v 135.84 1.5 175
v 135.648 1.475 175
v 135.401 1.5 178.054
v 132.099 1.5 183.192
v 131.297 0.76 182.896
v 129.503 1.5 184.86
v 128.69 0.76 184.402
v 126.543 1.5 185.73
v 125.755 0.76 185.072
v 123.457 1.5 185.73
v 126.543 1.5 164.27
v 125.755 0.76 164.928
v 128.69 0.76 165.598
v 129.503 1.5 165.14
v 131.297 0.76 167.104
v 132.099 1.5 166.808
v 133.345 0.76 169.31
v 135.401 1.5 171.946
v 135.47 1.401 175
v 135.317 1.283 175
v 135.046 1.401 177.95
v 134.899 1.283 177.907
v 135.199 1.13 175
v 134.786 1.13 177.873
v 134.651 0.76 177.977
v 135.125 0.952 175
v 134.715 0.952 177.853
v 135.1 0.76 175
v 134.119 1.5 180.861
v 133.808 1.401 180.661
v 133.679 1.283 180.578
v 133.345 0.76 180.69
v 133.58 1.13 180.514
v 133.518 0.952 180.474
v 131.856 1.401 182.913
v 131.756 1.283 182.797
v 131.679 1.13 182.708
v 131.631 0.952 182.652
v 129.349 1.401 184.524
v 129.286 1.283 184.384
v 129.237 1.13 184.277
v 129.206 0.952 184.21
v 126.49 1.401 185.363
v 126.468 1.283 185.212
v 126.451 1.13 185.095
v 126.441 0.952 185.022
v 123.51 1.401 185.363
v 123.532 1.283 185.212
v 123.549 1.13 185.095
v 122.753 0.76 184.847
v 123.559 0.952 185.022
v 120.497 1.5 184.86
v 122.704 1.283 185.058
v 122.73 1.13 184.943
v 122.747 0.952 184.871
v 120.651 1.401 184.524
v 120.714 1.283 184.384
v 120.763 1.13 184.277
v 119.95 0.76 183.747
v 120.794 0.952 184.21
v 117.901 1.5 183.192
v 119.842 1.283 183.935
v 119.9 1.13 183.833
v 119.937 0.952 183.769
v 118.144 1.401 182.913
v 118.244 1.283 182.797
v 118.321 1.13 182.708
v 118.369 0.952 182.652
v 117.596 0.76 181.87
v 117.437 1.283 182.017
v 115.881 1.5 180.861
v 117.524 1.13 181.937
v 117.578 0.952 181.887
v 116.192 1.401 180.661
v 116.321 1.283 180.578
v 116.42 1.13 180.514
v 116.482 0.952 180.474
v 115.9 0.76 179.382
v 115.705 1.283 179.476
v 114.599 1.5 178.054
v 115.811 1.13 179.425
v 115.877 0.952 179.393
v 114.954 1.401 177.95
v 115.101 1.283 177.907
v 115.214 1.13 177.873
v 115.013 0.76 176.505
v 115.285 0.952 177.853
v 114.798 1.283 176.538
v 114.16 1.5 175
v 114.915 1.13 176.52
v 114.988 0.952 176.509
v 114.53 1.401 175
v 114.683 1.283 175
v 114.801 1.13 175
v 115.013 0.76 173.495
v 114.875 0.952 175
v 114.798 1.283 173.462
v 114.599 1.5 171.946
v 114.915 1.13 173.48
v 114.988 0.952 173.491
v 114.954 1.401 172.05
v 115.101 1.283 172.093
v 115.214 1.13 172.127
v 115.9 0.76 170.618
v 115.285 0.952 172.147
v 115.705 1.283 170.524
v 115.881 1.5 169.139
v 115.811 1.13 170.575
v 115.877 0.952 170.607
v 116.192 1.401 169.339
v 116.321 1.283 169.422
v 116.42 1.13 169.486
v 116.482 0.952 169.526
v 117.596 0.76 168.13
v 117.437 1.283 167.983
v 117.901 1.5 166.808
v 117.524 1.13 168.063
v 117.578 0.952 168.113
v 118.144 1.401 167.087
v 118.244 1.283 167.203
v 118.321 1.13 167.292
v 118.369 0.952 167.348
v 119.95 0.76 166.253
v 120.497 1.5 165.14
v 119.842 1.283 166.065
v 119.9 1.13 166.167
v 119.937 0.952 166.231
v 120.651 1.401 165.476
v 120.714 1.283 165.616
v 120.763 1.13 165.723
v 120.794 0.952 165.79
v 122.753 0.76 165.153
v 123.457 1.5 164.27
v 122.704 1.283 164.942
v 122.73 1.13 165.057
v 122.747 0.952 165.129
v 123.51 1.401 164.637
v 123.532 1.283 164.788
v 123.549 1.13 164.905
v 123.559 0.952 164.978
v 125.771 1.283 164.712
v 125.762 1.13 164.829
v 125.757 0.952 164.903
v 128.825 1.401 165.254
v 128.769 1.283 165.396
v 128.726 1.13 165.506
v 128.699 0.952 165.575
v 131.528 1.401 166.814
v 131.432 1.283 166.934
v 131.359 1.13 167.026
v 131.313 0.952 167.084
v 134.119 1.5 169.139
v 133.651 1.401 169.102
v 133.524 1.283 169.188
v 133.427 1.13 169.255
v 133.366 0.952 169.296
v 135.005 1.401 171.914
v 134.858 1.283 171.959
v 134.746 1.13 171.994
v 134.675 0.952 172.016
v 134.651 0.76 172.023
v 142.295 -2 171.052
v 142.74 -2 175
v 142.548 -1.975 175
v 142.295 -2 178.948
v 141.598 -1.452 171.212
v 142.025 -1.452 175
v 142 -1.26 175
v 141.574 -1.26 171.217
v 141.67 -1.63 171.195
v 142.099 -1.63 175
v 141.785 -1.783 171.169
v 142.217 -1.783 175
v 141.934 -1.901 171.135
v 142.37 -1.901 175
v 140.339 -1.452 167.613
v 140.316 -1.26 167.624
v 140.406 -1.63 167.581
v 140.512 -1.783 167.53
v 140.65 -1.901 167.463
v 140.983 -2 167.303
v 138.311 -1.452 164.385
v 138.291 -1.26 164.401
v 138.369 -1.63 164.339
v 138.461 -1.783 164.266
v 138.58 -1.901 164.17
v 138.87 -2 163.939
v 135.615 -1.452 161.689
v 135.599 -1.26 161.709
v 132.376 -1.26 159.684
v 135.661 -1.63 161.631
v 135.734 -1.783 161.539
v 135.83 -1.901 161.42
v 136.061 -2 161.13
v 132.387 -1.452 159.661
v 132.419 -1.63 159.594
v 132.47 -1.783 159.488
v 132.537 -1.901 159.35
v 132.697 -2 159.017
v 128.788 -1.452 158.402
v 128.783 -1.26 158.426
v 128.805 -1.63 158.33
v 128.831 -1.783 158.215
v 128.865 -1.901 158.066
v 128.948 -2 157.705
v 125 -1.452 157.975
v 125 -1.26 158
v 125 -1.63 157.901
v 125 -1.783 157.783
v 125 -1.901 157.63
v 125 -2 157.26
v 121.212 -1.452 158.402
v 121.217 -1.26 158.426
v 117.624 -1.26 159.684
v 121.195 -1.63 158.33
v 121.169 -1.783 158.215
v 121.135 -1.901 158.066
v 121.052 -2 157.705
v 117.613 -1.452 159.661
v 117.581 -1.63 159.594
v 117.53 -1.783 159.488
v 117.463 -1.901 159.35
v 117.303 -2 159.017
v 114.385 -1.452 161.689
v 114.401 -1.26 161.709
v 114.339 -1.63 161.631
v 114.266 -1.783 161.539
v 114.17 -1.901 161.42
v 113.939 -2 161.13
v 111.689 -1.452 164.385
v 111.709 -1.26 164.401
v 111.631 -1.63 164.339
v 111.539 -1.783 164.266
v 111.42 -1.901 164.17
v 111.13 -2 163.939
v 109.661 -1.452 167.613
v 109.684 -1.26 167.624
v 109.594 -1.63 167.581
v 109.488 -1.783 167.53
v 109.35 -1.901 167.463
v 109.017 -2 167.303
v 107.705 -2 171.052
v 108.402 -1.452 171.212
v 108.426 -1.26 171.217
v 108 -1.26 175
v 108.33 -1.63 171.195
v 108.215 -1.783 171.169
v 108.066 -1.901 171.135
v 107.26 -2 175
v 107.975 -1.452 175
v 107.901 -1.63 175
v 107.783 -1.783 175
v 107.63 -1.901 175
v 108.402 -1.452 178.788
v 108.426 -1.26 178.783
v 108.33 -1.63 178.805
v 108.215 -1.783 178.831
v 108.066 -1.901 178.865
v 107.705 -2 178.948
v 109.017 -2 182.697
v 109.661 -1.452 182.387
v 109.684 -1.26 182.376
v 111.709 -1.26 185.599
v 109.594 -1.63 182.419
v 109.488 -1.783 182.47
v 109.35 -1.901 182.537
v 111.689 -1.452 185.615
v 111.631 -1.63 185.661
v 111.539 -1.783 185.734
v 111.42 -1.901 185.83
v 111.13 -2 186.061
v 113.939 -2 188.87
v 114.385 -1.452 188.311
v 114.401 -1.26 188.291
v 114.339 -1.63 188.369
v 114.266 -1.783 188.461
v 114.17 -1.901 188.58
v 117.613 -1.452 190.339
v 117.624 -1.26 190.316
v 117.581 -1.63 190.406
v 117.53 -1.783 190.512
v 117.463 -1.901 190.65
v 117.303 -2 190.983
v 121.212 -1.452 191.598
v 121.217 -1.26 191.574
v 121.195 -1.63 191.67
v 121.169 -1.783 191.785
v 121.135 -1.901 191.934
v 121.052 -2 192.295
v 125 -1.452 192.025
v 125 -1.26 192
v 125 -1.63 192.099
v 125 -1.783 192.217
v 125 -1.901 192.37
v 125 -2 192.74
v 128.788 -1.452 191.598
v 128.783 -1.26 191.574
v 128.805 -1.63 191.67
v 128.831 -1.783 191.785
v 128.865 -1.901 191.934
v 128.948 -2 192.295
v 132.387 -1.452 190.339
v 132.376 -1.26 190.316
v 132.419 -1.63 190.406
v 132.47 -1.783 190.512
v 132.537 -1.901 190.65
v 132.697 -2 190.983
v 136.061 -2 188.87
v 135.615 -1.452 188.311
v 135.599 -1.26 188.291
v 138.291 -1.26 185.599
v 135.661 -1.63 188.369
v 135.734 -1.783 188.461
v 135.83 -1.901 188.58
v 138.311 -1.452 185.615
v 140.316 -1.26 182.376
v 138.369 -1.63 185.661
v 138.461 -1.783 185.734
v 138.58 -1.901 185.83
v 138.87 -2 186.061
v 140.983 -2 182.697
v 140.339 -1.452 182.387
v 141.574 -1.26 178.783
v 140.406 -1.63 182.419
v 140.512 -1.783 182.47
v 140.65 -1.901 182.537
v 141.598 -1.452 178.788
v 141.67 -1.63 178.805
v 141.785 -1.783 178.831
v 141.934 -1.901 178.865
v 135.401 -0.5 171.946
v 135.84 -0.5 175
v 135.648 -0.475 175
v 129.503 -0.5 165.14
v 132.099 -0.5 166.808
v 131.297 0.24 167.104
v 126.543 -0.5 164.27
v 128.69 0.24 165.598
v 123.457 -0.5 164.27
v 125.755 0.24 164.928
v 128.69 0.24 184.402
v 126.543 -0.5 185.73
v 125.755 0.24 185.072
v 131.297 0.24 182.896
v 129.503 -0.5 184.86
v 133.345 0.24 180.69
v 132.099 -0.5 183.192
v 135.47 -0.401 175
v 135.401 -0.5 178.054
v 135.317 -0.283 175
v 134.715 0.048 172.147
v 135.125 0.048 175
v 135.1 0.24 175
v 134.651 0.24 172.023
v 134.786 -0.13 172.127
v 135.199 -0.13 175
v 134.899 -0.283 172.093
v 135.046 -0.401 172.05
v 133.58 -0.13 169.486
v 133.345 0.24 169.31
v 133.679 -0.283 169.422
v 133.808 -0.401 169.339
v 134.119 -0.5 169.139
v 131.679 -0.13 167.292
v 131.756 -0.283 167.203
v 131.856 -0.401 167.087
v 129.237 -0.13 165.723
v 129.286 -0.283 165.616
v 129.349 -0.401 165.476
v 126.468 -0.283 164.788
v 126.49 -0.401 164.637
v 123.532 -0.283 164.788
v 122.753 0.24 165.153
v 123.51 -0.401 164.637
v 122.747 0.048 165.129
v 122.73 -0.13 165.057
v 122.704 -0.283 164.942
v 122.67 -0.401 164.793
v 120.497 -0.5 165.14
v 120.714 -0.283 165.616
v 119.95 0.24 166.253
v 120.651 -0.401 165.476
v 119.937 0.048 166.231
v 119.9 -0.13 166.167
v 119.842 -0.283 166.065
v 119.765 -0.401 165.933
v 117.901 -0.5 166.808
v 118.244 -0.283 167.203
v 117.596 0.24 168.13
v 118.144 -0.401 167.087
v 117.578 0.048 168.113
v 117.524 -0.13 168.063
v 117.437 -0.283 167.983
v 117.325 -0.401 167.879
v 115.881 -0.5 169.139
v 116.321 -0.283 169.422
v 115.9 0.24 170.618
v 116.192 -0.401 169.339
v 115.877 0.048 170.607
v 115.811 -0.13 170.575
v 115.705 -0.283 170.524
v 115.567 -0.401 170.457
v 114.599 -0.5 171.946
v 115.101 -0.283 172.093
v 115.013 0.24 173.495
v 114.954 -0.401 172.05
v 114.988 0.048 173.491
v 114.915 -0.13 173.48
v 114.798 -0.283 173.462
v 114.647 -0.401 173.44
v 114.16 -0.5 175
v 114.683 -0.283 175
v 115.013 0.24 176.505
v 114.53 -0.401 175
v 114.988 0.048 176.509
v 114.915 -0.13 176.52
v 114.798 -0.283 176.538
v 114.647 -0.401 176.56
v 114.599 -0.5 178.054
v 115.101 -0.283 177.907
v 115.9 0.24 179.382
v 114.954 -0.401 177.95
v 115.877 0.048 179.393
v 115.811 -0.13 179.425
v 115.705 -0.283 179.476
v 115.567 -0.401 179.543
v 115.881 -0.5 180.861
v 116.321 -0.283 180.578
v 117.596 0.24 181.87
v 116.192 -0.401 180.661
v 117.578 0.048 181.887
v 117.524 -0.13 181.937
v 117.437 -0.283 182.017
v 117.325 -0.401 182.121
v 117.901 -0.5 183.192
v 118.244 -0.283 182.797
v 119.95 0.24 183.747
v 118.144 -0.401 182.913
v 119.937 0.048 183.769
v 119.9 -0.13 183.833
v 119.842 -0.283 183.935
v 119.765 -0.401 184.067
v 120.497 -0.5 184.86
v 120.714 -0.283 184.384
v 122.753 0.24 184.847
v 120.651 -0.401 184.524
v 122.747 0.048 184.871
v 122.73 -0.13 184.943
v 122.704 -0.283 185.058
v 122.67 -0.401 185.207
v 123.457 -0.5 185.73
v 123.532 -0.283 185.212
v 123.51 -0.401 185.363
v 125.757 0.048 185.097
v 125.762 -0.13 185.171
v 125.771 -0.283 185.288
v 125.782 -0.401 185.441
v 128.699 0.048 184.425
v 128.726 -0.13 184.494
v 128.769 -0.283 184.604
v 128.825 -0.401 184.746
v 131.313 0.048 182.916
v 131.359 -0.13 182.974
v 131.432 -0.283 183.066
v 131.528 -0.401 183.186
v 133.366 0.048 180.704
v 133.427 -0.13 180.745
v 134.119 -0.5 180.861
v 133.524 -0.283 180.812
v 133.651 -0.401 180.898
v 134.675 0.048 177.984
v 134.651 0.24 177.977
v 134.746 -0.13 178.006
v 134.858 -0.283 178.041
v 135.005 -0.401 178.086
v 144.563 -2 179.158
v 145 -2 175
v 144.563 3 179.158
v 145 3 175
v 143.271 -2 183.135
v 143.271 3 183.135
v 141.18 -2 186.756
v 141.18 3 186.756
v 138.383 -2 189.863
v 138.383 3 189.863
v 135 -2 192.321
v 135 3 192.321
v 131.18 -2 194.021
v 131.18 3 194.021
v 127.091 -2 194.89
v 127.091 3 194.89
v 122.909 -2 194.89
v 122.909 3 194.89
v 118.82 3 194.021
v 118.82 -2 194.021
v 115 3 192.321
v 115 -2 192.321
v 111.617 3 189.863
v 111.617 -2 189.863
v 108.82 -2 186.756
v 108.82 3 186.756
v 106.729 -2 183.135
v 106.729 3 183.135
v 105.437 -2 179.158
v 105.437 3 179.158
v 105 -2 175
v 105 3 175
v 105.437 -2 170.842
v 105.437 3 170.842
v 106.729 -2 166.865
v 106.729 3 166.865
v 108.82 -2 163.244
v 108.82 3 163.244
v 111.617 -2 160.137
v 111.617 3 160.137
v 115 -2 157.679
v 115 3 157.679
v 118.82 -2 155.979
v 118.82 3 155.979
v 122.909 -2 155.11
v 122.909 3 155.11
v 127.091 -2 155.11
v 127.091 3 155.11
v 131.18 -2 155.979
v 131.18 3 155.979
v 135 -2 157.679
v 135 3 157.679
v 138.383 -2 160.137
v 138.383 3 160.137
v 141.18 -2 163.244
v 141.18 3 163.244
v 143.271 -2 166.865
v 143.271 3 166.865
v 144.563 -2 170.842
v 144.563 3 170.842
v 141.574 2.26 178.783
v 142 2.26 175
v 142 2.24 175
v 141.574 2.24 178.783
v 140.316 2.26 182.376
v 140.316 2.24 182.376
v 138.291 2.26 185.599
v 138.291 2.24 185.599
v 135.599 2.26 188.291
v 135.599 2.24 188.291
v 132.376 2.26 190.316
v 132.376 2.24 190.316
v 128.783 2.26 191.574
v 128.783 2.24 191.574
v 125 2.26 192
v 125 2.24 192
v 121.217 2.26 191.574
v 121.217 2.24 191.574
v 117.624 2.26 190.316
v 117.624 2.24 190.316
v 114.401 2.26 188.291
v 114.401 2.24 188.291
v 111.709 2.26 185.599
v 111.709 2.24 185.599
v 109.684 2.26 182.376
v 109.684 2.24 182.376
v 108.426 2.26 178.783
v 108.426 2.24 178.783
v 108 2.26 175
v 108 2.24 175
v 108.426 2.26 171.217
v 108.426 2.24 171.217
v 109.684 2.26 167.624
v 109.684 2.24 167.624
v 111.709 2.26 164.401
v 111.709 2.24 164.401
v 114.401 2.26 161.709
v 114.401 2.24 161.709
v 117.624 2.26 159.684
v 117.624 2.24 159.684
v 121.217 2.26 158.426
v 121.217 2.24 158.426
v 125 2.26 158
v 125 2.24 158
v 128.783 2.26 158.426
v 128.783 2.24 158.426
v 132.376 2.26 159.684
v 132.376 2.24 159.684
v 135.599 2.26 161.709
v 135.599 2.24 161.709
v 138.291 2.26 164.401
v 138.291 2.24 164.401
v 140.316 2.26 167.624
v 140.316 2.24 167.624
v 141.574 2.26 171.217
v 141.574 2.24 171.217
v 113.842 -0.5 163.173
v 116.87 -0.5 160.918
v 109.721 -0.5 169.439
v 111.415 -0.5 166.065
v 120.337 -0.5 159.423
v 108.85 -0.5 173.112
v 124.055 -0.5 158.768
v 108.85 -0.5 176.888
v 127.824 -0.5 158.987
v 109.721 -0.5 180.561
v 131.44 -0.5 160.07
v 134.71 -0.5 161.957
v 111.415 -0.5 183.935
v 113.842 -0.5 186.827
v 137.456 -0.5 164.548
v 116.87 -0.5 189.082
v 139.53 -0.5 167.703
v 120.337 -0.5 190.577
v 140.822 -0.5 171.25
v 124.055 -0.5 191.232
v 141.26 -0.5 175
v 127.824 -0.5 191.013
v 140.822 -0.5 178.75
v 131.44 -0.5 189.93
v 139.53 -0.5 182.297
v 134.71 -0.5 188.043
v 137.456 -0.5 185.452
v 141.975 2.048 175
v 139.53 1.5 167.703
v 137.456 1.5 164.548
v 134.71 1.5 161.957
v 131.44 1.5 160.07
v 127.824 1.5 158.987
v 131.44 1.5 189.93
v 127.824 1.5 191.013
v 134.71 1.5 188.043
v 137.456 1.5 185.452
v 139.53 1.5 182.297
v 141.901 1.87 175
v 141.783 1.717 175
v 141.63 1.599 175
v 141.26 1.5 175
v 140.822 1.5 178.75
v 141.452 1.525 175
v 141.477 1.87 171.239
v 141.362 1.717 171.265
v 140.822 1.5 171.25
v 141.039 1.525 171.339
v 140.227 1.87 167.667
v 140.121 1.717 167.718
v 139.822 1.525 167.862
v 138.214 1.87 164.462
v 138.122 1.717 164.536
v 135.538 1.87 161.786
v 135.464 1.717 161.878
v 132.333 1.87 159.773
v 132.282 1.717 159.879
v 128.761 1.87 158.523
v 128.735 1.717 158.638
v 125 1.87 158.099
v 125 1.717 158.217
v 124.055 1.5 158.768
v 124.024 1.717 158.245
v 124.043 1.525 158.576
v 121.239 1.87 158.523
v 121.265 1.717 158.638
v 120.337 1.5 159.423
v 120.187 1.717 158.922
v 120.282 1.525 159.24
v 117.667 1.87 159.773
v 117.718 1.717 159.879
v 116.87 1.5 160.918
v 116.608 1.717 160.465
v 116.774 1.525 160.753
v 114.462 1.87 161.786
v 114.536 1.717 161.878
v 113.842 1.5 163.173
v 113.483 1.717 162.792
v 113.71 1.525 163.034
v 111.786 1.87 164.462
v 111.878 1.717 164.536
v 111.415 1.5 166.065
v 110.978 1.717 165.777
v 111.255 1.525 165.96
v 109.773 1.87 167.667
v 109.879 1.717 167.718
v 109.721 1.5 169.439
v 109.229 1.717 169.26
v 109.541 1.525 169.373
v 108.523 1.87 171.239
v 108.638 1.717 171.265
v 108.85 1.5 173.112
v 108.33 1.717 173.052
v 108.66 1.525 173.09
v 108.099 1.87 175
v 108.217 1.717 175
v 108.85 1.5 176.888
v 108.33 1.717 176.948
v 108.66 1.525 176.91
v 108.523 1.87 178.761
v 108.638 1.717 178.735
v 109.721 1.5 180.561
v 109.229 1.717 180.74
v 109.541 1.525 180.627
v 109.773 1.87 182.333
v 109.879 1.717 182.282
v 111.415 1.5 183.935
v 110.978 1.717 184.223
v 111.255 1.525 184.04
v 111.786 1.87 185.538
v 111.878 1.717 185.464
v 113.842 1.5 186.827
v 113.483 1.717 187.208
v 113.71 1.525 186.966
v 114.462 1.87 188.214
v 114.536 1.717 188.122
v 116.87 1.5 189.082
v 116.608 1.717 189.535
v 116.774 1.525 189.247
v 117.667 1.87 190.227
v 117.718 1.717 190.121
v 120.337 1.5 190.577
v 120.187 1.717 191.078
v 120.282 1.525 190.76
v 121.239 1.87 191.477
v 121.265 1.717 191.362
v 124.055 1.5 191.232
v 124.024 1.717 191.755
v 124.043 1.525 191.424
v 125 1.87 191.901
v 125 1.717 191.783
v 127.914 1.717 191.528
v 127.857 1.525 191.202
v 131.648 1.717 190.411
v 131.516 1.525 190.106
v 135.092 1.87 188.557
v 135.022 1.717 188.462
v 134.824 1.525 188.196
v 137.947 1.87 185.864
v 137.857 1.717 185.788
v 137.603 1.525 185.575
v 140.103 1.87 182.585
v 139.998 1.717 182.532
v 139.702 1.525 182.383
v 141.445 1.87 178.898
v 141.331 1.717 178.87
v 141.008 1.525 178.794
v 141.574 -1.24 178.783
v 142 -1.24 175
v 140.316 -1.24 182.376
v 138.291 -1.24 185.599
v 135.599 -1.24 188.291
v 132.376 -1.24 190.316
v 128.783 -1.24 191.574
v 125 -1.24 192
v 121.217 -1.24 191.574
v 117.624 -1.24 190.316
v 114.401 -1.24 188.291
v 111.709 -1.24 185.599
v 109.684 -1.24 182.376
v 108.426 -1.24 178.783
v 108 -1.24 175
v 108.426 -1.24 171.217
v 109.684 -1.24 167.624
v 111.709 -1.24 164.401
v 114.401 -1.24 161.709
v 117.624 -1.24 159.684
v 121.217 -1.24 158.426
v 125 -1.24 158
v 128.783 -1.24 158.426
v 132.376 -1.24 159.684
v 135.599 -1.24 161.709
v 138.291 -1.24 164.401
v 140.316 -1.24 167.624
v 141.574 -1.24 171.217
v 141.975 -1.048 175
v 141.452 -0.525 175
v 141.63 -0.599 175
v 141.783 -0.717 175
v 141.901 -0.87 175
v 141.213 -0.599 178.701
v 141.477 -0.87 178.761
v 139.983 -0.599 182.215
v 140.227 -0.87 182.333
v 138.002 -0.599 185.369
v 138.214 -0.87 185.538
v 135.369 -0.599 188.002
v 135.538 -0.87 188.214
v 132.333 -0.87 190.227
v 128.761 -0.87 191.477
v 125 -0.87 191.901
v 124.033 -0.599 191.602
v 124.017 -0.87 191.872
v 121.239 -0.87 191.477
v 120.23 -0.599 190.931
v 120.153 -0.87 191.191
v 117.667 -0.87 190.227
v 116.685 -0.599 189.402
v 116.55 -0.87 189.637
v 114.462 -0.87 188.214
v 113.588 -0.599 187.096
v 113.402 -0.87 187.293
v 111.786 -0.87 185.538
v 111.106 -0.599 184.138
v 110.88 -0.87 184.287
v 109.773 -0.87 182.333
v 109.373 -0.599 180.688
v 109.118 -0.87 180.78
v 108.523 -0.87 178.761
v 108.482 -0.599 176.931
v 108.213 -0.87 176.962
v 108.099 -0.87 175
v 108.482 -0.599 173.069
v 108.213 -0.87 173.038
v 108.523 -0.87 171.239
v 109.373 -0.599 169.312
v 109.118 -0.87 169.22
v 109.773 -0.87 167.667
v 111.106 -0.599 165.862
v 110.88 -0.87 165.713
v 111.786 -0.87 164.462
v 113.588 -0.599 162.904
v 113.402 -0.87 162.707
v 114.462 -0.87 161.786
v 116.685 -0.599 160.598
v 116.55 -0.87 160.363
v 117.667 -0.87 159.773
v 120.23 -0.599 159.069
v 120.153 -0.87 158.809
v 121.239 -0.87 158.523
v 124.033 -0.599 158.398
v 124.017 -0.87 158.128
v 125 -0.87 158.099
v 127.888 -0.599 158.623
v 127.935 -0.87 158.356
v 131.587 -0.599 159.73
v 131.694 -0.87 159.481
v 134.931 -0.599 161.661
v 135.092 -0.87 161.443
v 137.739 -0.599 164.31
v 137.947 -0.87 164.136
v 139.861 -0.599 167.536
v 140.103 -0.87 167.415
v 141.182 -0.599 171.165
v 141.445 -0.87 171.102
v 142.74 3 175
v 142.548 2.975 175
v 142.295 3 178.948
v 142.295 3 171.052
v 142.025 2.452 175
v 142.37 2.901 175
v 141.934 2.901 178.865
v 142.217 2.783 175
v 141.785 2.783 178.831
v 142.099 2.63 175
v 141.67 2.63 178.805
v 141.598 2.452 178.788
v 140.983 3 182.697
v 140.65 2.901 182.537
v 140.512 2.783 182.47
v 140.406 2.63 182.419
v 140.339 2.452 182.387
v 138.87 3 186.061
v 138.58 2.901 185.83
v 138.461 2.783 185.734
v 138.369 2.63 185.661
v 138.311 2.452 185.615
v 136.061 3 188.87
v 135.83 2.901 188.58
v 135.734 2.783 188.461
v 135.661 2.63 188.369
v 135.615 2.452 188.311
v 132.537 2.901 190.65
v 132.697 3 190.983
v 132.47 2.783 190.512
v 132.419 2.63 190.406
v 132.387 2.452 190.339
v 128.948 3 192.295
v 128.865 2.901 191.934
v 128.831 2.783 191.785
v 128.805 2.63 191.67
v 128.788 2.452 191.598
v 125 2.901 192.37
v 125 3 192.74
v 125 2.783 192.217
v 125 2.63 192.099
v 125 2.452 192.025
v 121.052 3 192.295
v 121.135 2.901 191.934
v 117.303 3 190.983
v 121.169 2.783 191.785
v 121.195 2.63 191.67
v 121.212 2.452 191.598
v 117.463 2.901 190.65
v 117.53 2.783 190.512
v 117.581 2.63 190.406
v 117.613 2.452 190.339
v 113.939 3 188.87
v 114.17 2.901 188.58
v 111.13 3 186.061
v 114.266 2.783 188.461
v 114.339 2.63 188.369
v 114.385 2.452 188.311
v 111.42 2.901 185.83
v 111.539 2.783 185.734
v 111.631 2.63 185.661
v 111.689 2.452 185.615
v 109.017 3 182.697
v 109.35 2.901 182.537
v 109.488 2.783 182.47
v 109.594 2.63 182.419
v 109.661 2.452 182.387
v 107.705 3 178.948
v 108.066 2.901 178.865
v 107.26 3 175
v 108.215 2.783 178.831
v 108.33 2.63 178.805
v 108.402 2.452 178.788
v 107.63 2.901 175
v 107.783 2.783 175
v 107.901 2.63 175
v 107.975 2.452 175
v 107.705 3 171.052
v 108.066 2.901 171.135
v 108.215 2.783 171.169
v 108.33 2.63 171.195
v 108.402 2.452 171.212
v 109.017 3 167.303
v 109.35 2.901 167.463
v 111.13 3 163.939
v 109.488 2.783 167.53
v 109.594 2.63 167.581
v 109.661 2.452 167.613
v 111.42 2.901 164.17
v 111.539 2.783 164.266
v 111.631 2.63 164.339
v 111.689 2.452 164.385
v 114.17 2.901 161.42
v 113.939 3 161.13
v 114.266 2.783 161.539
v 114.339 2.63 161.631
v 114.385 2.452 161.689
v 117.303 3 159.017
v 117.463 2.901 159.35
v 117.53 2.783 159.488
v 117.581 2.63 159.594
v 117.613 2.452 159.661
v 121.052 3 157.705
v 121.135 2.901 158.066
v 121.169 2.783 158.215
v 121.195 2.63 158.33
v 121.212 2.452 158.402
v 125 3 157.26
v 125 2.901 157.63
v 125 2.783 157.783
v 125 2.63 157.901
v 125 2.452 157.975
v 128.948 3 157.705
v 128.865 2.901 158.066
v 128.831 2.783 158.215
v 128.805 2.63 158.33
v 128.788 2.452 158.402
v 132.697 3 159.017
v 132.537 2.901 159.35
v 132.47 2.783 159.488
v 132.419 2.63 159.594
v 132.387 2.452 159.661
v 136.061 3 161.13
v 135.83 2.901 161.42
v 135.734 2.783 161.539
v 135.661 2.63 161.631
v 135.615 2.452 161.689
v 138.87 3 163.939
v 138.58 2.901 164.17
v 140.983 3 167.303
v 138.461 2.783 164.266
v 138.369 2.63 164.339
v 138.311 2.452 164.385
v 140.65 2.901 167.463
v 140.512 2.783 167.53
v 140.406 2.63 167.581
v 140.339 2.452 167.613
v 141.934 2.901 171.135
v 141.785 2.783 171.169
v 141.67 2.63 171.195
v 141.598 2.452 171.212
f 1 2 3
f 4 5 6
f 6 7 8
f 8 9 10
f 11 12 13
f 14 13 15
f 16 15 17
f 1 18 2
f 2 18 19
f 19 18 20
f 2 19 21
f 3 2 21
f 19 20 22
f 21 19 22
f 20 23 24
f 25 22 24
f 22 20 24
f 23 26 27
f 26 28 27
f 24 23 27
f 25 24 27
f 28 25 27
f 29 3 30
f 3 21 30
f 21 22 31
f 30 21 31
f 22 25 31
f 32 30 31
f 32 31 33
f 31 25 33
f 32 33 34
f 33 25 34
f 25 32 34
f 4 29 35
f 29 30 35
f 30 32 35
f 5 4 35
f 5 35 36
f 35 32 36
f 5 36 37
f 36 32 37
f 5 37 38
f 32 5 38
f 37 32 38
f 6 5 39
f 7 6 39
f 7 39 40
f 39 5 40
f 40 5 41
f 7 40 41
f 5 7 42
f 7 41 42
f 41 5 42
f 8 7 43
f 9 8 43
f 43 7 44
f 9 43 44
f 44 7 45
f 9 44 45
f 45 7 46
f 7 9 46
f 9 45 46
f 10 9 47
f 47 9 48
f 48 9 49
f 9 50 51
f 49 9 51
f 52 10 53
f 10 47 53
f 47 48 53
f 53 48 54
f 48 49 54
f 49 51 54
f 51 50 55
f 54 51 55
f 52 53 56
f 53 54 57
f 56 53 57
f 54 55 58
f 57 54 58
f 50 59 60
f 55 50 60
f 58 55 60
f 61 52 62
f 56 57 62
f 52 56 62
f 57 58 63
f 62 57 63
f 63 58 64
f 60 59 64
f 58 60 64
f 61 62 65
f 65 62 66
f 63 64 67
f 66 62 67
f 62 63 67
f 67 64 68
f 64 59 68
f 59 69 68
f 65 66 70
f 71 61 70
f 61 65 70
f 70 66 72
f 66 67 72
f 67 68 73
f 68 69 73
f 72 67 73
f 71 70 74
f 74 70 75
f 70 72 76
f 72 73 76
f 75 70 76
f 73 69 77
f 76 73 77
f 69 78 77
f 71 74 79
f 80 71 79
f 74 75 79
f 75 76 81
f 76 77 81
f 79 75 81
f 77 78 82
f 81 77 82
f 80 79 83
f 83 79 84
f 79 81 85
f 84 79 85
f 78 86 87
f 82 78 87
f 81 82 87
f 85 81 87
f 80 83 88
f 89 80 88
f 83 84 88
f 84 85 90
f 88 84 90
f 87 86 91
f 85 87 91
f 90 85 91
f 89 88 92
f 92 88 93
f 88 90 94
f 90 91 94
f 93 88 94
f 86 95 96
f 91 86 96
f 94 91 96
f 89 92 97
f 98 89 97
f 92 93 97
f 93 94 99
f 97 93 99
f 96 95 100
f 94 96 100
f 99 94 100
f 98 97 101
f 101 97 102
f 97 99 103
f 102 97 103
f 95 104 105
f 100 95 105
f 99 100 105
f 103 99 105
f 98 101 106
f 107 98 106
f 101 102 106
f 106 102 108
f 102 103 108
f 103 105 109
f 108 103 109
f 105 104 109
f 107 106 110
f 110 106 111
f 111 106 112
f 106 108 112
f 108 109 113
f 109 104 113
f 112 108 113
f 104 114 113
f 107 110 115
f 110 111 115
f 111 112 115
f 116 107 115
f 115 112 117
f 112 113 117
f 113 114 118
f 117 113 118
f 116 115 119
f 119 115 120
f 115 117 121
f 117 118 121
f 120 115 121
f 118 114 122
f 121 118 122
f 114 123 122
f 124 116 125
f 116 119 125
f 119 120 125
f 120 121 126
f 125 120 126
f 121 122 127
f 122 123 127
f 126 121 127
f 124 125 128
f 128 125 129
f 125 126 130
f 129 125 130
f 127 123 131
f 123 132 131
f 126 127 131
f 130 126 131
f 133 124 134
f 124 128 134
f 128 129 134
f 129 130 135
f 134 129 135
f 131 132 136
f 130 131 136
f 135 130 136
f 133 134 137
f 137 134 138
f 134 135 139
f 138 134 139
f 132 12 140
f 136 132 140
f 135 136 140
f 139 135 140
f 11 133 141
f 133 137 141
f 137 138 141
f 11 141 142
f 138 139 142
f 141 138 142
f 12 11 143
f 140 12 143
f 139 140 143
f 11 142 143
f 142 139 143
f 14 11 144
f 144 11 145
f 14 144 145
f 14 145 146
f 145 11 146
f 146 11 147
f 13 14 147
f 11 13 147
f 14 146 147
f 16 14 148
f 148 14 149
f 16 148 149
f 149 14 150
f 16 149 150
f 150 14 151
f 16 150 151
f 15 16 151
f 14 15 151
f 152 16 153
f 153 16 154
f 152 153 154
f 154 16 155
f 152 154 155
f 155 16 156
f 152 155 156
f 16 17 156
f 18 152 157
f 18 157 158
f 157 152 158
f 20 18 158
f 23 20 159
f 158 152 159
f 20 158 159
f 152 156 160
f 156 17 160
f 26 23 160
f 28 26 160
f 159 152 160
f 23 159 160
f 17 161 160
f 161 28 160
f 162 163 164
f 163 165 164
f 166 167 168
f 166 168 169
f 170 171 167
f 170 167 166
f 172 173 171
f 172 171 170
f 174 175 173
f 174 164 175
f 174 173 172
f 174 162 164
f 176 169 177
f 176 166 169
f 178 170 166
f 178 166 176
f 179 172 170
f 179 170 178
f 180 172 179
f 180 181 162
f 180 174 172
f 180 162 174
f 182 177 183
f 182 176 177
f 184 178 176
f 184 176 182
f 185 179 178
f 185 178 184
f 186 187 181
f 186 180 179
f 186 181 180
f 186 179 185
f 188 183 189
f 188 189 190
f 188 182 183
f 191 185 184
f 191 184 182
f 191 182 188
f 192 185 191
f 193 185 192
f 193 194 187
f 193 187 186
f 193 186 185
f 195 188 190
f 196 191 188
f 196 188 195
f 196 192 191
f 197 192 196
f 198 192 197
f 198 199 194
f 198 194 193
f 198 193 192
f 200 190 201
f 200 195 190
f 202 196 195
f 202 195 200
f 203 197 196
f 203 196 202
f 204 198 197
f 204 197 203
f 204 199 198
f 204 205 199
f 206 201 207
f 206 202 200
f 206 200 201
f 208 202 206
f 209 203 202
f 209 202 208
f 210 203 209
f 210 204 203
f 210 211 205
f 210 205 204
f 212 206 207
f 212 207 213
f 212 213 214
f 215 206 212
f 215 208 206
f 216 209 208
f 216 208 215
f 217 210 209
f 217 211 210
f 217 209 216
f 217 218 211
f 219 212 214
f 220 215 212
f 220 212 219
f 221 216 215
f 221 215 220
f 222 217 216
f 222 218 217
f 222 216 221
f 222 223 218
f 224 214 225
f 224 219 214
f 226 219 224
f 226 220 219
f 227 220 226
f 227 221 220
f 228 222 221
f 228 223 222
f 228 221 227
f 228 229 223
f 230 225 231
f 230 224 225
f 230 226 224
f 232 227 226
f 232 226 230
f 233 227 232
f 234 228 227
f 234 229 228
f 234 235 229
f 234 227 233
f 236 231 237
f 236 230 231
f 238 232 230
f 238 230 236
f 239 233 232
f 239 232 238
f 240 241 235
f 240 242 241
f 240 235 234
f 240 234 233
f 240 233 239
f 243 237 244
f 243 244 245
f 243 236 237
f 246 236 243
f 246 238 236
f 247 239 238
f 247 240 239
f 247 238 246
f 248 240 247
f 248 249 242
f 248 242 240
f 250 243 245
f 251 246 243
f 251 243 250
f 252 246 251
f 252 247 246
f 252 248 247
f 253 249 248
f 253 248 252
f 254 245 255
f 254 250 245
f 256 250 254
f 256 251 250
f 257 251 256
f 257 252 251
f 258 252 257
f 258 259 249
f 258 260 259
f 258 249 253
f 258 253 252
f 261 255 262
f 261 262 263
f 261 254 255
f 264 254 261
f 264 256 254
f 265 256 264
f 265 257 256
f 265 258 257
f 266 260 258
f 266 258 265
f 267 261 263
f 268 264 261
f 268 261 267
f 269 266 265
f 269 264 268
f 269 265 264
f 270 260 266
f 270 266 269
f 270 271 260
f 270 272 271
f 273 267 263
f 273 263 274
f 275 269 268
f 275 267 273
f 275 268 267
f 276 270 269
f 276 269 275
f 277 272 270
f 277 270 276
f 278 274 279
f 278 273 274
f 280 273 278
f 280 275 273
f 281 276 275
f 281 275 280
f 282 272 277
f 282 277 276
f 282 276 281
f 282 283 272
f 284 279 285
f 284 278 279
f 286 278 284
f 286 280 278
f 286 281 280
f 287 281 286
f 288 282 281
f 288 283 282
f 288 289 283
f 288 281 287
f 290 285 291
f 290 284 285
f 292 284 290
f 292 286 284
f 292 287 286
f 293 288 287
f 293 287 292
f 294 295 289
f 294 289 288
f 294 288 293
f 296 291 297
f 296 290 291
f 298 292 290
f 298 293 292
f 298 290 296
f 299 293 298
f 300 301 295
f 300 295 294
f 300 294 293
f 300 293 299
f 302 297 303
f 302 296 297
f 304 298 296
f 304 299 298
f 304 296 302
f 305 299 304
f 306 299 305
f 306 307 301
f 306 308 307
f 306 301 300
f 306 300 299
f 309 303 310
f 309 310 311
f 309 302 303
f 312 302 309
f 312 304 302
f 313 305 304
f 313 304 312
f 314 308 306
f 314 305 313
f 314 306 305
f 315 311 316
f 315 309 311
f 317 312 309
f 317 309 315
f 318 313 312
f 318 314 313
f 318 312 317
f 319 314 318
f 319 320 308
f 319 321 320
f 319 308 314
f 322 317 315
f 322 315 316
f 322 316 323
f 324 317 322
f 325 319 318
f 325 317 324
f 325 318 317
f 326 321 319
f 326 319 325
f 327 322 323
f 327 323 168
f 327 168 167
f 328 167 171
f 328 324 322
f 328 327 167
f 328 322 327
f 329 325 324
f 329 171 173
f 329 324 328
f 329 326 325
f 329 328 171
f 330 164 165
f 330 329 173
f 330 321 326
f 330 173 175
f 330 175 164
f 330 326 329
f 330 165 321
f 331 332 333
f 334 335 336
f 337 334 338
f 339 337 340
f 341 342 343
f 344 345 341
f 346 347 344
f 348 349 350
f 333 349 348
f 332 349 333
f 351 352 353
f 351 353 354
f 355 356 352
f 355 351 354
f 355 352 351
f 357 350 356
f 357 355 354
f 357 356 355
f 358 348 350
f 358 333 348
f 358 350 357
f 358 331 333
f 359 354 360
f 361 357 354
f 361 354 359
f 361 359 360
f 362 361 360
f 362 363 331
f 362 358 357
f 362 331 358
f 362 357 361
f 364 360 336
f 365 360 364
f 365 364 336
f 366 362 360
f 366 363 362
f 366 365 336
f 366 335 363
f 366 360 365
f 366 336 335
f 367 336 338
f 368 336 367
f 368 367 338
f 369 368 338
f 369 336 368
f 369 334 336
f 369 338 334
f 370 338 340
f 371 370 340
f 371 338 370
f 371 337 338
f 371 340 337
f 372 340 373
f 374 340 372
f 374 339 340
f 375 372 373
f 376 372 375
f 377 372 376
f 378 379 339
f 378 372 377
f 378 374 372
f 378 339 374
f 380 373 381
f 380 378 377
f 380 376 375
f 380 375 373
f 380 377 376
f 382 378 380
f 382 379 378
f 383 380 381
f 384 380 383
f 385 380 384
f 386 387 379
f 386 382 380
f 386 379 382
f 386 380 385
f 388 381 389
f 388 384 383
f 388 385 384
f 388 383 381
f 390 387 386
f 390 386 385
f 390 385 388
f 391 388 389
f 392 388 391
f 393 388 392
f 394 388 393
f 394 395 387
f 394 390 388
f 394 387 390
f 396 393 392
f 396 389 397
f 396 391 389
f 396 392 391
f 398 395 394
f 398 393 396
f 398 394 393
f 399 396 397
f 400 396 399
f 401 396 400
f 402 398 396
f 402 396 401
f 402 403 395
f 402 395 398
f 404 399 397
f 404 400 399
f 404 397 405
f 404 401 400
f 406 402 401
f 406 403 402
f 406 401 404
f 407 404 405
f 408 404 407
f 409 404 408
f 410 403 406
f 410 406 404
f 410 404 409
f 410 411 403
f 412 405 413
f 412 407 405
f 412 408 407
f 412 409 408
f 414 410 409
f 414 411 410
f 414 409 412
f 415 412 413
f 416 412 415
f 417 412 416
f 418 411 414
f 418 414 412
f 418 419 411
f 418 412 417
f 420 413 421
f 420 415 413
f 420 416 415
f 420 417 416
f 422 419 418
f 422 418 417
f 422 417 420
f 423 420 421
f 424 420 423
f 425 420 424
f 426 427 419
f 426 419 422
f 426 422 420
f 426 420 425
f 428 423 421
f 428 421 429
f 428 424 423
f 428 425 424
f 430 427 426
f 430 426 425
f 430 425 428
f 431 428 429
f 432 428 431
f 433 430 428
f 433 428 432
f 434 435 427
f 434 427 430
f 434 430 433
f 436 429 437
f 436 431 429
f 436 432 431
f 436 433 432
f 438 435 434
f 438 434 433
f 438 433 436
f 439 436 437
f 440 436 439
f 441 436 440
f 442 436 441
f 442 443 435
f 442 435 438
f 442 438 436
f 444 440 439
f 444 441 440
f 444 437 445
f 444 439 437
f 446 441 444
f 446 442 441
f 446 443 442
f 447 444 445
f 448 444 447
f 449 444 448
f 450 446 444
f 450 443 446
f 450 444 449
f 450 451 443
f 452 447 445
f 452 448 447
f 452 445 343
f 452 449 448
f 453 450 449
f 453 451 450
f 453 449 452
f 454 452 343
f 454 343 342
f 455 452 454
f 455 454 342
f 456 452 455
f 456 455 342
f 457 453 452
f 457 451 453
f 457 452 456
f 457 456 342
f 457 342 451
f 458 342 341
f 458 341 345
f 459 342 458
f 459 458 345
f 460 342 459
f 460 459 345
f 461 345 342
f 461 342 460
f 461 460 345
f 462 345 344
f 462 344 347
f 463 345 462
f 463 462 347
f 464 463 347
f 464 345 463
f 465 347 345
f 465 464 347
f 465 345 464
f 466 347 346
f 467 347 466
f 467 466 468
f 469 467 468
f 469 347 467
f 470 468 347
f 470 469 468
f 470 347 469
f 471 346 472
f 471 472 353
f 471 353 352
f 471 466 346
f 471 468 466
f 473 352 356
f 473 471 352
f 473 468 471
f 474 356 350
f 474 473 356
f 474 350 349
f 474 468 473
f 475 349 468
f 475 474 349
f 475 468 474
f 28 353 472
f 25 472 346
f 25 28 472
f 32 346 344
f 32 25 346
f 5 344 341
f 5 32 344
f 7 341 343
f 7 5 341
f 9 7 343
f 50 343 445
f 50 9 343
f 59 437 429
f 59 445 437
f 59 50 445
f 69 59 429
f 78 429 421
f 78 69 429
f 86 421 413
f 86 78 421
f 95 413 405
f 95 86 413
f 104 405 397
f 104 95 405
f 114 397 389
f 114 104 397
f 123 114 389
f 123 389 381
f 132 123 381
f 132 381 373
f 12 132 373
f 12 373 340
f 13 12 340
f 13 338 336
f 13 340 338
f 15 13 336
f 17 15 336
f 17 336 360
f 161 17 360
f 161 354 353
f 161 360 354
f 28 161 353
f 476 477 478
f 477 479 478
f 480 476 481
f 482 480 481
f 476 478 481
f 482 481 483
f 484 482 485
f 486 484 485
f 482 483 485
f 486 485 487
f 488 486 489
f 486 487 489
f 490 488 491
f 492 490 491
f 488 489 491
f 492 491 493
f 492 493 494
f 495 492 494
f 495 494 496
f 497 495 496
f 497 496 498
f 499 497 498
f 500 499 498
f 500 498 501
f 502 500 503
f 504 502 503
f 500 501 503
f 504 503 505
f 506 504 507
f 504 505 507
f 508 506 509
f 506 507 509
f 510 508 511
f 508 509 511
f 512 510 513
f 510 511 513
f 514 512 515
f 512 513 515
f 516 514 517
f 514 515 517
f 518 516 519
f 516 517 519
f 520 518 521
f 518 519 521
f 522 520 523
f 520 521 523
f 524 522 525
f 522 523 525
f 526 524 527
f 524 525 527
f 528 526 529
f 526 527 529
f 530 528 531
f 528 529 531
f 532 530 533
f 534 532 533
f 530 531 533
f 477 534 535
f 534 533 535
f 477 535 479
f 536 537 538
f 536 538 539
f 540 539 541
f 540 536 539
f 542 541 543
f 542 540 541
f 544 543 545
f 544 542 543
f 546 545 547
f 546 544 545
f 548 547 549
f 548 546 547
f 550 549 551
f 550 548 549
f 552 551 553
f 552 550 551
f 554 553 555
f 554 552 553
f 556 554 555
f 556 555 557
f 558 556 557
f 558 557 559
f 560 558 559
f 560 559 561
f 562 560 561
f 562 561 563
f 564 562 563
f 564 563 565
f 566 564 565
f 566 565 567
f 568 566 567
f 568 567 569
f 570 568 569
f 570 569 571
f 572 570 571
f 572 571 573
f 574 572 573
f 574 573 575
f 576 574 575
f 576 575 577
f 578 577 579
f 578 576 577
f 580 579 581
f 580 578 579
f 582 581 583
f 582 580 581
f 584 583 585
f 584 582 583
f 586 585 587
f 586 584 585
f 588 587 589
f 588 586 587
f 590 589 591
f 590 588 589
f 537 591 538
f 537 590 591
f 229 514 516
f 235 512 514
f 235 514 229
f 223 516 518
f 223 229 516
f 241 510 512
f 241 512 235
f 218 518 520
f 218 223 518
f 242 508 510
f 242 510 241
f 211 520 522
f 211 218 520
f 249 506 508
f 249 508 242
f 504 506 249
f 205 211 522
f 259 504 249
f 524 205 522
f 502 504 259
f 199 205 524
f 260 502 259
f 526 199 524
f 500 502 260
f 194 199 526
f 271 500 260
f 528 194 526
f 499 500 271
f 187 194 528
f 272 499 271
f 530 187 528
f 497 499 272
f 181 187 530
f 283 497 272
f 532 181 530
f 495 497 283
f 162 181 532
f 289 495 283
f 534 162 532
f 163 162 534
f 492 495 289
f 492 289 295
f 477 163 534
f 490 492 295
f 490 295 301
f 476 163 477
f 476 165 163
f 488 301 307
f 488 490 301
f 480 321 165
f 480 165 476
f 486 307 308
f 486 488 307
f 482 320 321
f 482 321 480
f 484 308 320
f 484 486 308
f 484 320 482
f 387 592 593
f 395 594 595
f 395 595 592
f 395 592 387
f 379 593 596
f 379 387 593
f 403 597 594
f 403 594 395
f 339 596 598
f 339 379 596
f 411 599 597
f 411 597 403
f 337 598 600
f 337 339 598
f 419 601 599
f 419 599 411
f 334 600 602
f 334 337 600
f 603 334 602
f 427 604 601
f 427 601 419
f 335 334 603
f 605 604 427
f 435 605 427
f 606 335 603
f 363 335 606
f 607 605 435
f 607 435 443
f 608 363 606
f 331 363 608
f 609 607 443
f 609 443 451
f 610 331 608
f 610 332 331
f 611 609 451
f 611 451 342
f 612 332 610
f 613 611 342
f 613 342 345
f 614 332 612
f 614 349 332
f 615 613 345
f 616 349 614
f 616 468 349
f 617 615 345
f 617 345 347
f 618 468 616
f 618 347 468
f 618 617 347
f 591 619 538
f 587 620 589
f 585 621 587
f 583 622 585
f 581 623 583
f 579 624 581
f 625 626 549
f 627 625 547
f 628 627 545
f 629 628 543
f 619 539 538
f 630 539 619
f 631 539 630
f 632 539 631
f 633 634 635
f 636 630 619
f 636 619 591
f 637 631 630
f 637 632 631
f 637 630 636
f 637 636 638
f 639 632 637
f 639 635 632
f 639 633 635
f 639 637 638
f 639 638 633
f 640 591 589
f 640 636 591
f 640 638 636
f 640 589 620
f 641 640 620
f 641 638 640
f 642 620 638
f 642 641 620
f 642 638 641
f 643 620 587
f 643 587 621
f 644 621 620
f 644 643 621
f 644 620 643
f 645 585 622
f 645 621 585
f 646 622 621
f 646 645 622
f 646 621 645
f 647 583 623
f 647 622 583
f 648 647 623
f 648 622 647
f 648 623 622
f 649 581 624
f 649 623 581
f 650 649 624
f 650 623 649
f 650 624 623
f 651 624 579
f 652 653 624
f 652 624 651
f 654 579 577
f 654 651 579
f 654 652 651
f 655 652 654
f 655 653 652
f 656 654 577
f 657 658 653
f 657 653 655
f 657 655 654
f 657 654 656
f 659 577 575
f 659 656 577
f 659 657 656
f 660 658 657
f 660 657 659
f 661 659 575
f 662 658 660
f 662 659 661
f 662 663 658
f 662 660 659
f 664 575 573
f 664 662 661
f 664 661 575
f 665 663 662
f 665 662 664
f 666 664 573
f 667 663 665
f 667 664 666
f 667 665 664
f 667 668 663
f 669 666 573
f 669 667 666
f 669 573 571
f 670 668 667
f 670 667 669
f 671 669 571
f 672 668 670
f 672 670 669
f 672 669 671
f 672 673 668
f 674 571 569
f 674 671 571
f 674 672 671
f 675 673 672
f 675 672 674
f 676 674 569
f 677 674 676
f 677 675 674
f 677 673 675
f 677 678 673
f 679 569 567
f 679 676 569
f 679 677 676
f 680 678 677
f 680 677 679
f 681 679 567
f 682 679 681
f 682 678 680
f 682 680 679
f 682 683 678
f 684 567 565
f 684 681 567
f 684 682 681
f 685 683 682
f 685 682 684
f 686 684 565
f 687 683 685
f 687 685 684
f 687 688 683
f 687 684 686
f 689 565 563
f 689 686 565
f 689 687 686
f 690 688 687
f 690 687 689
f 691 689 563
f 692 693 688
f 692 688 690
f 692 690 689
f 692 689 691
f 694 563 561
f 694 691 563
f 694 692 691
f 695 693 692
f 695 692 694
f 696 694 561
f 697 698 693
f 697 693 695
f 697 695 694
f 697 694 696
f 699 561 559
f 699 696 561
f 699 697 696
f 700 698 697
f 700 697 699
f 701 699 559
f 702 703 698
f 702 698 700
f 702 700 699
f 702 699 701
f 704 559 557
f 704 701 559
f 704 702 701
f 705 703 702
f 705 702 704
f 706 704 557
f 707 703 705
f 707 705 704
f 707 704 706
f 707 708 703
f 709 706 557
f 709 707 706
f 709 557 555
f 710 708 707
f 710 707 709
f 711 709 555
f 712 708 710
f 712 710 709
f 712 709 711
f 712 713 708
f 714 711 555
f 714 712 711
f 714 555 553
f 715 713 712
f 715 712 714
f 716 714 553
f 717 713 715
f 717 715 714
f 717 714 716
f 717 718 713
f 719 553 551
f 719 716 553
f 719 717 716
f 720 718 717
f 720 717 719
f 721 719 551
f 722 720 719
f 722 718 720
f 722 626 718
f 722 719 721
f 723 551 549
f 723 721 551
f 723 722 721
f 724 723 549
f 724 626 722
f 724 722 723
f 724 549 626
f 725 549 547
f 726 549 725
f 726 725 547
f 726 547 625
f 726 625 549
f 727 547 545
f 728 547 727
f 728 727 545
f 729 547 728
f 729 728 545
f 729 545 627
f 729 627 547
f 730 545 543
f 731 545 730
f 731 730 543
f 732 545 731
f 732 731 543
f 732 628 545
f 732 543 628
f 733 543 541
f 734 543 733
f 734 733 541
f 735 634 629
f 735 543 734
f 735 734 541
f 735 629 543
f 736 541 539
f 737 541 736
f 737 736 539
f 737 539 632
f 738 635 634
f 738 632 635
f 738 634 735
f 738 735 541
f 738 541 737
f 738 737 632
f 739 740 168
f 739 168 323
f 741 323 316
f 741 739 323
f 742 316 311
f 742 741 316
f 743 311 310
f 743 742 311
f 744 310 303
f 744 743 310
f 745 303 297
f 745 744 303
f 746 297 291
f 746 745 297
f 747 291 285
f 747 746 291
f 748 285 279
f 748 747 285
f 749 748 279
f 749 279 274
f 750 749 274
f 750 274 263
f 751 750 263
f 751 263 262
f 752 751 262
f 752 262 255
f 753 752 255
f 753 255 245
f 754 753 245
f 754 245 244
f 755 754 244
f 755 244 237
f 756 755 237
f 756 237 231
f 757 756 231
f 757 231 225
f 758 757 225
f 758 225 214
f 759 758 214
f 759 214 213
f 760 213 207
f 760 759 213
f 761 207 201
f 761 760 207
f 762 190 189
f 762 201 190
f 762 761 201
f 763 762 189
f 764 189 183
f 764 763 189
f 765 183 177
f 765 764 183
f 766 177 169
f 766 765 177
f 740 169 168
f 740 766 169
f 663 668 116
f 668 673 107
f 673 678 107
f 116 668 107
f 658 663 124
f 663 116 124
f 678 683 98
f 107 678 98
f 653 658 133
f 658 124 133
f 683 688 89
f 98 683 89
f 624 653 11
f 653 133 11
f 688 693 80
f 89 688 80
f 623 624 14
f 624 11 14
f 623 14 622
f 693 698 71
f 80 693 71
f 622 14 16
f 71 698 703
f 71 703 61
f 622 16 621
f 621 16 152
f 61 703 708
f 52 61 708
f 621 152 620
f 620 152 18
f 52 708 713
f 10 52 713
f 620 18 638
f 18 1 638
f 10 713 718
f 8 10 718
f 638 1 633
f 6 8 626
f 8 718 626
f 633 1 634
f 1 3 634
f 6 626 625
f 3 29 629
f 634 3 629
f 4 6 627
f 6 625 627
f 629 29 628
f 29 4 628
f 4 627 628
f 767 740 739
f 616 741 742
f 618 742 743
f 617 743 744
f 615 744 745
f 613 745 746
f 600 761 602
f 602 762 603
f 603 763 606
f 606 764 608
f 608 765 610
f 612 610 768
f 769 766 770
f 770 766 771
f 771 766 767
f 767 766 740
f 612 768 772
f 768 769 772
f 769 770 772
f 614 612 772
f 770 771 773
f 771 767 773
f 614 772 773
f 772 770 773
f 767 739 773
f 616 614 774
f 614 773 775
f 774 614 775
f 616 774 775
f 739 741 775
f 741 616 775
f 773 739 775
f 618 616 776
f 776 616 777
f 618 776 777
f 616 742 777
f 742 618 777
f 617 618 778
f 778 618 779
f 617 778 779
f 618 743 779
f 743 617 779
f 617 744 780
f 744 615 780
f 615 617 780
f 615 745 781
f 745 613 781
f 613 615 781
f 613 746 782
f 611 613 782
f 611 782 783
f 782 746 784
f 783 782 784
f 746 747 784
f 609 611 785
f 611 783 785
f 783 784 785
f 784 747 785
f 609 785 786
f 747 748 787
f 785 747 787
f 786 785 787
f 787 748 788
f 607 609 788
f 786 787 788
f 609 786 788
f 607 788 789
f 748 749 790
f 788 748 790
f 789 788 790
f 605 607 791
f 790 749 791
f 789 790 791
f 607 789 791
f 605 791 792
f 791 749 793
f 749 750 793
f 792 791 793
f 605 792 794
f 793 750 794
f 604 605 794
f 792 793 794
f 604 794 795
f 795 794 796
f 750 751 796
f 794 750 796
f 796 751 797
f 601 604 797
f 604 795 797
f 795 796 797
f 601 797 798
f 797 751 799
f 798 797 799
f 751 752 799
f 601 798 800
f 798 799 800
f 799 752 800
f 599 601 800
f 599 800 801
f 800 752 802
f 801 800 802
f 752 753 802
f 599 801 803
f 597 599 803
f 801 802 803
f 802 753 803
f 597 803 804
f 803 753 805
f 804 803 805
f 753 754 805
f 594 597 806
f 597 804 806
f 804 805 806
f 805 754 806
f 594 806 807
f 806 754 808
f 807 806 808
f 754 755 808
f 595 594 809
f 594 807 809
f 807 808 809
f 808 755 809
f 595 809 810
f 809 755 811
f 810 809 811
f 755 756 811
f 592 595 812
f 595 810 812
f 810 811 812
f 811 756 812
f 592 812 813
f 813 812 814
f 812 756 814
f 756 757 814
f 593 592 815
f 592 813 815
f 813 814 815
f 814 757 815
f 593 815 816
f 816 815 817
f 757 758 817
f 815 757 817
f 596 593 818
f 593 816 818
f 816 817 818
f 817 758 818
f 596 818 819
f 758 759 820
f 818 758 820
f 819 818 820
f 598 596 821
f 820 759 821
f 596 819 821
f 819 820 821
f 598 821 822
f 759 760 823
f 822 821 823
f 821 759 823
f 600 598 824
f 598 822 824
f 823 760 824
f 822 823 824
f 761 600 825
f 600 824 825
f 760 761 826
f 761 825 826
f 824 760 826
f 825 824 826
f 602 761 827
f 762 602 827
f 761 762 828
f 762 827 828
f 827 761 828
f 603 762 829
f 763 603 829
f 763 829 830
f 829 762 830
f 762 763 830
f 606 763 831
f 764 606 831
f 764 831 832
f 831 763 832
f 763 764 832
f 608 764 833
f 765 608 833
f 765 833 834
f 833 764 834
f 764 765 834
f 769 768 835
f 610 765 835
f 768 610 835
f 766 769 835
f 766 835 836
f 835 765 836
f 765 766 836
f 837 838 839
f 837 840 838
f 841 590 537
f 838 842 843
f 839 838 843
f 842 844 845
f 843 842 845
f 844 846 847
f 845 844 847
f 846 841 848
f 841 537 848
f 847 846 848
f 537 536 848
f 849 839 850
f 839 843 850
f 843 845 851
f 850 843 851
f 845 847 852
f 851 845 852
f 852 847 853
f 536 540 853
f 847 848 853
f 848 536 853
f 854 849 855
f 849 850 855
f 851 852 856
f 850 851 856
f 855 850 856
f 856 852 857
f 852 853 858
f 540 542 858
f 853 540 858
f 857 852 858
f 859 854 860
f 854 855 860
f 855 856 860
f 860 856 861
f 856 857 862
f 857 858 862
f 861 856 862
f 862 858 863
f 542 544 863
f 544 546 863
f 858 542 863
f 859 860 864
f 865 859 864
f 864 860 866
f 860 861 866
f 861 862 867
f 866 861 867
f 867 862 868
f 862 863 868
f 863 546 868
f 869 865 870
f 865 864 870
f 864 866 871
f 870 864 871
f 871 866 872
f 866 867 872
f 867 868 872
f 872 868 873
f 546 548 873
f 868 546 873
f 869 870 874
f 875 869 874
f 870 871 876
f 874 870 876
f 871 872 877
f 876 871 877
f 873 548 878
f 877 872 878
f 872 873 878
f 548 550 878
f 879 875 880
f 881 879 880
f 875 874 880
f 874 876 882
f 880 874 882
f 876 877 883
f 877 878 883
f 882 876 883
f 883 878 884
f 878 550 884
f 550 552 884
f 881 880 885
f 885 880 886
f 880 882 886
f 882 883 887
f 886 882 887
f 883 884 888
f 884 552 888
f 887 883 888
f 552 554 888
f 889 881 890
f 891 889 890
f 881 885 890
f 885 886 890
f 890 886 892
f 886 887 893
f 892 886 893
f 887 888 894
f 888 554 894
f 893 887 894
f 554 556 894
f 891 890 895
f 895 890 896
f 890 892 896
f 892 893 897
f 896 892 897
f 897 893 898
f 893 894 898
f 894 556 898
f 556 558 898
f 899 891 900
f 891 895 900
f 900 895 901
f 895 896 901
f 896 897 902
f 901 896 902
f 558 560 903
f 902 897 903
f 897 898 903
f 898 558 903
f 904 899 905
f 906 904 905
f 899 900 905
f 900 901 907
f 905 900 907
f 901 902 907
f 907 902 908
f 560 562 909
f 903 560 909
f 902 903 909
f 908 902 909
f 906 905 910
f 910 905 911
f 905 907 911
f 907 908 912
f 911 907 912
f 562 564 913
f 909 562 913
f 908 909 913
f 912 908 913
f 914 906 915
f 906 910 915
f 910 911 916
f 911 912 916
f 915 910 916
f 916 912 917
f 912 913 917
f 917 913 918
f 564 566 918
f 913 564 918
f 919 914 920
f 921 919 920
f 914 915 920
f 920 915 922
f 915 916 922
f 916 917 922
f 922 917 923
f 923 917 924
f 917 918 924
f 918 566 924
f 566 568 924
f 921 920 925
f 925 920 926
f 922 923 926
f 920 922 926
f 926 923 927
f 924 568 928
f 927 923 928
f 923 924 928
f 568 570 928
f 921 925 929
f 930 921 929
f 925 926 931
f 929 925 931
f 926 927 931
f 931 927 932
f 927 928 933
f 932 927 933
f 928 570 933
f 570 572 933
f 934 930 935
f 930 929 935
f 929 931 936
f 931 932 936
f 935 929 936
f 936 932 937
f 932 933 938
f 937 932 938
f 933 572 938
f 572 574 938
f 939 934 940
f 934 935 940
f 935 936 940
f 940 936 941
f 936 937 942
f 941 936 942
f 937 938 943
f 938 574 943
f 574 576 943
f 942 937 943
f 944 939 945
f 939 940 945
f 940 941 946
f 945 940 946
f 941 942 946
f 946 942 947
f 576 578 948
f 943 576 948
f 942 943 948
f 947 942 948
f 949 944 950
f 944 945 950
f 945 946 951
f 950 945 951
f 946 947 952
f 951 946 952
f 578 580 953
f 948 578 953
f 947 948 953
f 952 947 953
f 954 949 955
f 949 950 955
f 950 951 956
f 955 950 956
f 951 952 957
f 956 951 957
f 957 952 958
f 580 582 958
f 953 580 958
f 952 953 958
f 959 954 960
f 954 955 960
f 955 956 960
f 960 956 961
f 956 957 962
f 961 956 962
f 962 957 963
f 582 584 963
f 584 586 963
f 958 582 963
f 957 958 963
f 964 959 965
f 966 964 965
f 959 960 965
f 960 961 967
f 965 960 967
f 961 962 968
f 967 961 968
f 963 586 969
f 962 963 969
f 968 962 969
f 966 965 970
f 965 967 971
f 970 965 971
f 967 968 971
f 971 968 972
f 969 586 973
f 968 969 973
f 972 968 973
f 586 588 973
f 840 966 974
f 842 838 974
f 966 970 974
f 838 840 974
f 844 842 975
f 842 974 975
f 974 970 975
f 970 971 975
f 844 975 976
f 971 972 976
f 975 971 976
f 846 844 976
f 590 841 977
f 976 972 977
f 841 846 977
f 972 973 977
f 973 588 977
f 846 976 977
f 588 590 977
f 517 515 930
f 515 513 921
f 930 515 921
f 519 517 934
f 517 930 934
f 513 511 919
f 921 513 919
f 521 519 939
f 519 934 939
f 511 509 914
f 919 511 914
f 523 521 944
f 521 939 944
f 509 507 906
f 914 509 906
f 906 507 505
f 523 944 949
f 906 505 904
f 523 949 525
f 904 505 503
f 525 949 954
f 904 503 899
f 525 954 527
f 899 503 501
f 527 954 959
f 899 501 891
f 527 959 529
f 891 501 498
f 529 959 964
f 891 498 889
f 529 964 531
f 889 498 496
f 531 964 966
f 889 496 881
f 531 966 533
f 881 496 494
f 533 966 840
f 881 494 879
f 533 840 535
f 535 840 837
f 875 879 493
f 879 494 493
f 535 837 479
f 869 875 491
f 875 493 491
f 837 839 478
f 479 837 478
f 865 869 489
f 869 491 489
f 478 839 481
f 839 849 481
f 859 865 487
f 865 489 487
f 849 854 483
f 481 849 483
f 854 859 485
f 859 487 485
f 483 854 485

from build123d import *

# Parameters (mm, degrees)
CYLINDER646_R          = 17
CYLINDER646_DEPTH      = 3
CYLINDER645_R          = 20
CYLINDER645_DEPTH      = 1.5
CUT286_PLACEMENT_ANGLE = 90
CYLINDER648_R          = 17
CYLINDER648_DEPTH      = 3
CYLINDER647_R          = 20
CYLINDER647_DEPTH      = 1.5
CUT287_PLACEMENT_ANGLE = 90
CYLINDER436_R          = 10.1
CYLINDER436_DEPTH      = 3
CYLINDER435_R          = 20
CYLINDER435_DEPTH      = 2
CUT219_PLACEMENT_ANGLE = 90
FILLET103_R            = 0.74


with BuildPart() as cylinder646:
    # Cylinder646 → Cylinder646 (new body)
    with BuildSketch(Plane.XY):
        Circle(CYLINDER646_R)
    extrude(amount=CYLINDER646_DEPTH)


with BuildPart() as guiding_aid001:
    # Cylinder645 → Cylinder645 (new body)
    with BuildSketch(Plane.XY):
        Circle(CYLINDER645_R)
    extrude(amount=CYLINDER645_DEPTH)

    # Cut286: cut Cylinder646
    add(cylinder646.part, mode=Mode.SUBTRACT)


with BuildPart() as guiding_aid001_1:
    # Cut286 placement: moved
    add(guiding_aid001.part.moved(Location((125, 3, 175))).rotate(Axis((125, 3, 175), (1, 0, 0)), CUT286_PLACEMENT_ANGLE))


with BuildPart() as cylinder648:
    # Cylinder648 → Cylinder648 (new body)
    with BuildSketch(Plane.XY):
        Circle(CYLINDER648_R)
    extrude(amount=CYLINDER648_DEPTH)


with BuildPart() as guiding_aid002:
    # Cylinder647 → Cylinder647 (new body)
    with BuildSketch(Plane.XY):
        Circle(CYLINDER647_R)
    extrude(amount=CYLINDER647_DEPTH)

    # Cut287: cut Cylinder648
    add(cylinder648.part, mode=Mode.SUBTRACT)


with BuildPart() as guiding_aid002_1:
    # Cut287 placement: moved
    add(guiding_aid002.part.moved(Location((125, -0.5, 175))).rotate(Axis((125, -0.5, 175), (1, 0, 0)), CUT287_PLACEMENT_ANGLE))


with BuildPart() as cylinder436:
    # Cylinder436 → Cylinder436 (new body)
    with BuildSketch(Plane.XY):
        Circle(CYLINDER436_R)
    extrude(amount=CYLINDER436_DEPTH)


with BuildPart() as guiding_aid:
    # Cylinder435 → Cylinder435 (new body)
    with BuildSketch(Plane.XY):
        Circle(CYLINDER435_R)
    extrude(amount=CYLINDER435_DEPTH)

    # Cut219: cut Cylinder436
    add(cylinder436.part, mode=Mode.SUBTRACT)


with BuildPart() as guiding_aid_1:
    # Cut219 placement: moved
    add(guiding_aid.part.moved(Location((125, 1.5, 175))).rotate(Axis((125, 1.5, 175), (1, 0, 0)), CUT219_PLACEMENT_ANGLE))

    # Fusion315: union guiding aid001, guiding aid002
    add(guiding_aid001_1.part)
    add(guiding_aid002_1.part)

    # Fillet103
    fillet103_edges = [guiding_aid_1.edges().sort_by_distance(p)[0] for p in [
        (108, 3, 175),
        (108, -2, 175),
        (108, 1.5, 175),
        (108, -0.5, 175),
        (114.9, 1.5, 175),
        (114.9, -0.5, 175),
    ]]
    fillet(fillet103_edges, radius=FILLET103_R)


solid = guiding_aid_1.part
